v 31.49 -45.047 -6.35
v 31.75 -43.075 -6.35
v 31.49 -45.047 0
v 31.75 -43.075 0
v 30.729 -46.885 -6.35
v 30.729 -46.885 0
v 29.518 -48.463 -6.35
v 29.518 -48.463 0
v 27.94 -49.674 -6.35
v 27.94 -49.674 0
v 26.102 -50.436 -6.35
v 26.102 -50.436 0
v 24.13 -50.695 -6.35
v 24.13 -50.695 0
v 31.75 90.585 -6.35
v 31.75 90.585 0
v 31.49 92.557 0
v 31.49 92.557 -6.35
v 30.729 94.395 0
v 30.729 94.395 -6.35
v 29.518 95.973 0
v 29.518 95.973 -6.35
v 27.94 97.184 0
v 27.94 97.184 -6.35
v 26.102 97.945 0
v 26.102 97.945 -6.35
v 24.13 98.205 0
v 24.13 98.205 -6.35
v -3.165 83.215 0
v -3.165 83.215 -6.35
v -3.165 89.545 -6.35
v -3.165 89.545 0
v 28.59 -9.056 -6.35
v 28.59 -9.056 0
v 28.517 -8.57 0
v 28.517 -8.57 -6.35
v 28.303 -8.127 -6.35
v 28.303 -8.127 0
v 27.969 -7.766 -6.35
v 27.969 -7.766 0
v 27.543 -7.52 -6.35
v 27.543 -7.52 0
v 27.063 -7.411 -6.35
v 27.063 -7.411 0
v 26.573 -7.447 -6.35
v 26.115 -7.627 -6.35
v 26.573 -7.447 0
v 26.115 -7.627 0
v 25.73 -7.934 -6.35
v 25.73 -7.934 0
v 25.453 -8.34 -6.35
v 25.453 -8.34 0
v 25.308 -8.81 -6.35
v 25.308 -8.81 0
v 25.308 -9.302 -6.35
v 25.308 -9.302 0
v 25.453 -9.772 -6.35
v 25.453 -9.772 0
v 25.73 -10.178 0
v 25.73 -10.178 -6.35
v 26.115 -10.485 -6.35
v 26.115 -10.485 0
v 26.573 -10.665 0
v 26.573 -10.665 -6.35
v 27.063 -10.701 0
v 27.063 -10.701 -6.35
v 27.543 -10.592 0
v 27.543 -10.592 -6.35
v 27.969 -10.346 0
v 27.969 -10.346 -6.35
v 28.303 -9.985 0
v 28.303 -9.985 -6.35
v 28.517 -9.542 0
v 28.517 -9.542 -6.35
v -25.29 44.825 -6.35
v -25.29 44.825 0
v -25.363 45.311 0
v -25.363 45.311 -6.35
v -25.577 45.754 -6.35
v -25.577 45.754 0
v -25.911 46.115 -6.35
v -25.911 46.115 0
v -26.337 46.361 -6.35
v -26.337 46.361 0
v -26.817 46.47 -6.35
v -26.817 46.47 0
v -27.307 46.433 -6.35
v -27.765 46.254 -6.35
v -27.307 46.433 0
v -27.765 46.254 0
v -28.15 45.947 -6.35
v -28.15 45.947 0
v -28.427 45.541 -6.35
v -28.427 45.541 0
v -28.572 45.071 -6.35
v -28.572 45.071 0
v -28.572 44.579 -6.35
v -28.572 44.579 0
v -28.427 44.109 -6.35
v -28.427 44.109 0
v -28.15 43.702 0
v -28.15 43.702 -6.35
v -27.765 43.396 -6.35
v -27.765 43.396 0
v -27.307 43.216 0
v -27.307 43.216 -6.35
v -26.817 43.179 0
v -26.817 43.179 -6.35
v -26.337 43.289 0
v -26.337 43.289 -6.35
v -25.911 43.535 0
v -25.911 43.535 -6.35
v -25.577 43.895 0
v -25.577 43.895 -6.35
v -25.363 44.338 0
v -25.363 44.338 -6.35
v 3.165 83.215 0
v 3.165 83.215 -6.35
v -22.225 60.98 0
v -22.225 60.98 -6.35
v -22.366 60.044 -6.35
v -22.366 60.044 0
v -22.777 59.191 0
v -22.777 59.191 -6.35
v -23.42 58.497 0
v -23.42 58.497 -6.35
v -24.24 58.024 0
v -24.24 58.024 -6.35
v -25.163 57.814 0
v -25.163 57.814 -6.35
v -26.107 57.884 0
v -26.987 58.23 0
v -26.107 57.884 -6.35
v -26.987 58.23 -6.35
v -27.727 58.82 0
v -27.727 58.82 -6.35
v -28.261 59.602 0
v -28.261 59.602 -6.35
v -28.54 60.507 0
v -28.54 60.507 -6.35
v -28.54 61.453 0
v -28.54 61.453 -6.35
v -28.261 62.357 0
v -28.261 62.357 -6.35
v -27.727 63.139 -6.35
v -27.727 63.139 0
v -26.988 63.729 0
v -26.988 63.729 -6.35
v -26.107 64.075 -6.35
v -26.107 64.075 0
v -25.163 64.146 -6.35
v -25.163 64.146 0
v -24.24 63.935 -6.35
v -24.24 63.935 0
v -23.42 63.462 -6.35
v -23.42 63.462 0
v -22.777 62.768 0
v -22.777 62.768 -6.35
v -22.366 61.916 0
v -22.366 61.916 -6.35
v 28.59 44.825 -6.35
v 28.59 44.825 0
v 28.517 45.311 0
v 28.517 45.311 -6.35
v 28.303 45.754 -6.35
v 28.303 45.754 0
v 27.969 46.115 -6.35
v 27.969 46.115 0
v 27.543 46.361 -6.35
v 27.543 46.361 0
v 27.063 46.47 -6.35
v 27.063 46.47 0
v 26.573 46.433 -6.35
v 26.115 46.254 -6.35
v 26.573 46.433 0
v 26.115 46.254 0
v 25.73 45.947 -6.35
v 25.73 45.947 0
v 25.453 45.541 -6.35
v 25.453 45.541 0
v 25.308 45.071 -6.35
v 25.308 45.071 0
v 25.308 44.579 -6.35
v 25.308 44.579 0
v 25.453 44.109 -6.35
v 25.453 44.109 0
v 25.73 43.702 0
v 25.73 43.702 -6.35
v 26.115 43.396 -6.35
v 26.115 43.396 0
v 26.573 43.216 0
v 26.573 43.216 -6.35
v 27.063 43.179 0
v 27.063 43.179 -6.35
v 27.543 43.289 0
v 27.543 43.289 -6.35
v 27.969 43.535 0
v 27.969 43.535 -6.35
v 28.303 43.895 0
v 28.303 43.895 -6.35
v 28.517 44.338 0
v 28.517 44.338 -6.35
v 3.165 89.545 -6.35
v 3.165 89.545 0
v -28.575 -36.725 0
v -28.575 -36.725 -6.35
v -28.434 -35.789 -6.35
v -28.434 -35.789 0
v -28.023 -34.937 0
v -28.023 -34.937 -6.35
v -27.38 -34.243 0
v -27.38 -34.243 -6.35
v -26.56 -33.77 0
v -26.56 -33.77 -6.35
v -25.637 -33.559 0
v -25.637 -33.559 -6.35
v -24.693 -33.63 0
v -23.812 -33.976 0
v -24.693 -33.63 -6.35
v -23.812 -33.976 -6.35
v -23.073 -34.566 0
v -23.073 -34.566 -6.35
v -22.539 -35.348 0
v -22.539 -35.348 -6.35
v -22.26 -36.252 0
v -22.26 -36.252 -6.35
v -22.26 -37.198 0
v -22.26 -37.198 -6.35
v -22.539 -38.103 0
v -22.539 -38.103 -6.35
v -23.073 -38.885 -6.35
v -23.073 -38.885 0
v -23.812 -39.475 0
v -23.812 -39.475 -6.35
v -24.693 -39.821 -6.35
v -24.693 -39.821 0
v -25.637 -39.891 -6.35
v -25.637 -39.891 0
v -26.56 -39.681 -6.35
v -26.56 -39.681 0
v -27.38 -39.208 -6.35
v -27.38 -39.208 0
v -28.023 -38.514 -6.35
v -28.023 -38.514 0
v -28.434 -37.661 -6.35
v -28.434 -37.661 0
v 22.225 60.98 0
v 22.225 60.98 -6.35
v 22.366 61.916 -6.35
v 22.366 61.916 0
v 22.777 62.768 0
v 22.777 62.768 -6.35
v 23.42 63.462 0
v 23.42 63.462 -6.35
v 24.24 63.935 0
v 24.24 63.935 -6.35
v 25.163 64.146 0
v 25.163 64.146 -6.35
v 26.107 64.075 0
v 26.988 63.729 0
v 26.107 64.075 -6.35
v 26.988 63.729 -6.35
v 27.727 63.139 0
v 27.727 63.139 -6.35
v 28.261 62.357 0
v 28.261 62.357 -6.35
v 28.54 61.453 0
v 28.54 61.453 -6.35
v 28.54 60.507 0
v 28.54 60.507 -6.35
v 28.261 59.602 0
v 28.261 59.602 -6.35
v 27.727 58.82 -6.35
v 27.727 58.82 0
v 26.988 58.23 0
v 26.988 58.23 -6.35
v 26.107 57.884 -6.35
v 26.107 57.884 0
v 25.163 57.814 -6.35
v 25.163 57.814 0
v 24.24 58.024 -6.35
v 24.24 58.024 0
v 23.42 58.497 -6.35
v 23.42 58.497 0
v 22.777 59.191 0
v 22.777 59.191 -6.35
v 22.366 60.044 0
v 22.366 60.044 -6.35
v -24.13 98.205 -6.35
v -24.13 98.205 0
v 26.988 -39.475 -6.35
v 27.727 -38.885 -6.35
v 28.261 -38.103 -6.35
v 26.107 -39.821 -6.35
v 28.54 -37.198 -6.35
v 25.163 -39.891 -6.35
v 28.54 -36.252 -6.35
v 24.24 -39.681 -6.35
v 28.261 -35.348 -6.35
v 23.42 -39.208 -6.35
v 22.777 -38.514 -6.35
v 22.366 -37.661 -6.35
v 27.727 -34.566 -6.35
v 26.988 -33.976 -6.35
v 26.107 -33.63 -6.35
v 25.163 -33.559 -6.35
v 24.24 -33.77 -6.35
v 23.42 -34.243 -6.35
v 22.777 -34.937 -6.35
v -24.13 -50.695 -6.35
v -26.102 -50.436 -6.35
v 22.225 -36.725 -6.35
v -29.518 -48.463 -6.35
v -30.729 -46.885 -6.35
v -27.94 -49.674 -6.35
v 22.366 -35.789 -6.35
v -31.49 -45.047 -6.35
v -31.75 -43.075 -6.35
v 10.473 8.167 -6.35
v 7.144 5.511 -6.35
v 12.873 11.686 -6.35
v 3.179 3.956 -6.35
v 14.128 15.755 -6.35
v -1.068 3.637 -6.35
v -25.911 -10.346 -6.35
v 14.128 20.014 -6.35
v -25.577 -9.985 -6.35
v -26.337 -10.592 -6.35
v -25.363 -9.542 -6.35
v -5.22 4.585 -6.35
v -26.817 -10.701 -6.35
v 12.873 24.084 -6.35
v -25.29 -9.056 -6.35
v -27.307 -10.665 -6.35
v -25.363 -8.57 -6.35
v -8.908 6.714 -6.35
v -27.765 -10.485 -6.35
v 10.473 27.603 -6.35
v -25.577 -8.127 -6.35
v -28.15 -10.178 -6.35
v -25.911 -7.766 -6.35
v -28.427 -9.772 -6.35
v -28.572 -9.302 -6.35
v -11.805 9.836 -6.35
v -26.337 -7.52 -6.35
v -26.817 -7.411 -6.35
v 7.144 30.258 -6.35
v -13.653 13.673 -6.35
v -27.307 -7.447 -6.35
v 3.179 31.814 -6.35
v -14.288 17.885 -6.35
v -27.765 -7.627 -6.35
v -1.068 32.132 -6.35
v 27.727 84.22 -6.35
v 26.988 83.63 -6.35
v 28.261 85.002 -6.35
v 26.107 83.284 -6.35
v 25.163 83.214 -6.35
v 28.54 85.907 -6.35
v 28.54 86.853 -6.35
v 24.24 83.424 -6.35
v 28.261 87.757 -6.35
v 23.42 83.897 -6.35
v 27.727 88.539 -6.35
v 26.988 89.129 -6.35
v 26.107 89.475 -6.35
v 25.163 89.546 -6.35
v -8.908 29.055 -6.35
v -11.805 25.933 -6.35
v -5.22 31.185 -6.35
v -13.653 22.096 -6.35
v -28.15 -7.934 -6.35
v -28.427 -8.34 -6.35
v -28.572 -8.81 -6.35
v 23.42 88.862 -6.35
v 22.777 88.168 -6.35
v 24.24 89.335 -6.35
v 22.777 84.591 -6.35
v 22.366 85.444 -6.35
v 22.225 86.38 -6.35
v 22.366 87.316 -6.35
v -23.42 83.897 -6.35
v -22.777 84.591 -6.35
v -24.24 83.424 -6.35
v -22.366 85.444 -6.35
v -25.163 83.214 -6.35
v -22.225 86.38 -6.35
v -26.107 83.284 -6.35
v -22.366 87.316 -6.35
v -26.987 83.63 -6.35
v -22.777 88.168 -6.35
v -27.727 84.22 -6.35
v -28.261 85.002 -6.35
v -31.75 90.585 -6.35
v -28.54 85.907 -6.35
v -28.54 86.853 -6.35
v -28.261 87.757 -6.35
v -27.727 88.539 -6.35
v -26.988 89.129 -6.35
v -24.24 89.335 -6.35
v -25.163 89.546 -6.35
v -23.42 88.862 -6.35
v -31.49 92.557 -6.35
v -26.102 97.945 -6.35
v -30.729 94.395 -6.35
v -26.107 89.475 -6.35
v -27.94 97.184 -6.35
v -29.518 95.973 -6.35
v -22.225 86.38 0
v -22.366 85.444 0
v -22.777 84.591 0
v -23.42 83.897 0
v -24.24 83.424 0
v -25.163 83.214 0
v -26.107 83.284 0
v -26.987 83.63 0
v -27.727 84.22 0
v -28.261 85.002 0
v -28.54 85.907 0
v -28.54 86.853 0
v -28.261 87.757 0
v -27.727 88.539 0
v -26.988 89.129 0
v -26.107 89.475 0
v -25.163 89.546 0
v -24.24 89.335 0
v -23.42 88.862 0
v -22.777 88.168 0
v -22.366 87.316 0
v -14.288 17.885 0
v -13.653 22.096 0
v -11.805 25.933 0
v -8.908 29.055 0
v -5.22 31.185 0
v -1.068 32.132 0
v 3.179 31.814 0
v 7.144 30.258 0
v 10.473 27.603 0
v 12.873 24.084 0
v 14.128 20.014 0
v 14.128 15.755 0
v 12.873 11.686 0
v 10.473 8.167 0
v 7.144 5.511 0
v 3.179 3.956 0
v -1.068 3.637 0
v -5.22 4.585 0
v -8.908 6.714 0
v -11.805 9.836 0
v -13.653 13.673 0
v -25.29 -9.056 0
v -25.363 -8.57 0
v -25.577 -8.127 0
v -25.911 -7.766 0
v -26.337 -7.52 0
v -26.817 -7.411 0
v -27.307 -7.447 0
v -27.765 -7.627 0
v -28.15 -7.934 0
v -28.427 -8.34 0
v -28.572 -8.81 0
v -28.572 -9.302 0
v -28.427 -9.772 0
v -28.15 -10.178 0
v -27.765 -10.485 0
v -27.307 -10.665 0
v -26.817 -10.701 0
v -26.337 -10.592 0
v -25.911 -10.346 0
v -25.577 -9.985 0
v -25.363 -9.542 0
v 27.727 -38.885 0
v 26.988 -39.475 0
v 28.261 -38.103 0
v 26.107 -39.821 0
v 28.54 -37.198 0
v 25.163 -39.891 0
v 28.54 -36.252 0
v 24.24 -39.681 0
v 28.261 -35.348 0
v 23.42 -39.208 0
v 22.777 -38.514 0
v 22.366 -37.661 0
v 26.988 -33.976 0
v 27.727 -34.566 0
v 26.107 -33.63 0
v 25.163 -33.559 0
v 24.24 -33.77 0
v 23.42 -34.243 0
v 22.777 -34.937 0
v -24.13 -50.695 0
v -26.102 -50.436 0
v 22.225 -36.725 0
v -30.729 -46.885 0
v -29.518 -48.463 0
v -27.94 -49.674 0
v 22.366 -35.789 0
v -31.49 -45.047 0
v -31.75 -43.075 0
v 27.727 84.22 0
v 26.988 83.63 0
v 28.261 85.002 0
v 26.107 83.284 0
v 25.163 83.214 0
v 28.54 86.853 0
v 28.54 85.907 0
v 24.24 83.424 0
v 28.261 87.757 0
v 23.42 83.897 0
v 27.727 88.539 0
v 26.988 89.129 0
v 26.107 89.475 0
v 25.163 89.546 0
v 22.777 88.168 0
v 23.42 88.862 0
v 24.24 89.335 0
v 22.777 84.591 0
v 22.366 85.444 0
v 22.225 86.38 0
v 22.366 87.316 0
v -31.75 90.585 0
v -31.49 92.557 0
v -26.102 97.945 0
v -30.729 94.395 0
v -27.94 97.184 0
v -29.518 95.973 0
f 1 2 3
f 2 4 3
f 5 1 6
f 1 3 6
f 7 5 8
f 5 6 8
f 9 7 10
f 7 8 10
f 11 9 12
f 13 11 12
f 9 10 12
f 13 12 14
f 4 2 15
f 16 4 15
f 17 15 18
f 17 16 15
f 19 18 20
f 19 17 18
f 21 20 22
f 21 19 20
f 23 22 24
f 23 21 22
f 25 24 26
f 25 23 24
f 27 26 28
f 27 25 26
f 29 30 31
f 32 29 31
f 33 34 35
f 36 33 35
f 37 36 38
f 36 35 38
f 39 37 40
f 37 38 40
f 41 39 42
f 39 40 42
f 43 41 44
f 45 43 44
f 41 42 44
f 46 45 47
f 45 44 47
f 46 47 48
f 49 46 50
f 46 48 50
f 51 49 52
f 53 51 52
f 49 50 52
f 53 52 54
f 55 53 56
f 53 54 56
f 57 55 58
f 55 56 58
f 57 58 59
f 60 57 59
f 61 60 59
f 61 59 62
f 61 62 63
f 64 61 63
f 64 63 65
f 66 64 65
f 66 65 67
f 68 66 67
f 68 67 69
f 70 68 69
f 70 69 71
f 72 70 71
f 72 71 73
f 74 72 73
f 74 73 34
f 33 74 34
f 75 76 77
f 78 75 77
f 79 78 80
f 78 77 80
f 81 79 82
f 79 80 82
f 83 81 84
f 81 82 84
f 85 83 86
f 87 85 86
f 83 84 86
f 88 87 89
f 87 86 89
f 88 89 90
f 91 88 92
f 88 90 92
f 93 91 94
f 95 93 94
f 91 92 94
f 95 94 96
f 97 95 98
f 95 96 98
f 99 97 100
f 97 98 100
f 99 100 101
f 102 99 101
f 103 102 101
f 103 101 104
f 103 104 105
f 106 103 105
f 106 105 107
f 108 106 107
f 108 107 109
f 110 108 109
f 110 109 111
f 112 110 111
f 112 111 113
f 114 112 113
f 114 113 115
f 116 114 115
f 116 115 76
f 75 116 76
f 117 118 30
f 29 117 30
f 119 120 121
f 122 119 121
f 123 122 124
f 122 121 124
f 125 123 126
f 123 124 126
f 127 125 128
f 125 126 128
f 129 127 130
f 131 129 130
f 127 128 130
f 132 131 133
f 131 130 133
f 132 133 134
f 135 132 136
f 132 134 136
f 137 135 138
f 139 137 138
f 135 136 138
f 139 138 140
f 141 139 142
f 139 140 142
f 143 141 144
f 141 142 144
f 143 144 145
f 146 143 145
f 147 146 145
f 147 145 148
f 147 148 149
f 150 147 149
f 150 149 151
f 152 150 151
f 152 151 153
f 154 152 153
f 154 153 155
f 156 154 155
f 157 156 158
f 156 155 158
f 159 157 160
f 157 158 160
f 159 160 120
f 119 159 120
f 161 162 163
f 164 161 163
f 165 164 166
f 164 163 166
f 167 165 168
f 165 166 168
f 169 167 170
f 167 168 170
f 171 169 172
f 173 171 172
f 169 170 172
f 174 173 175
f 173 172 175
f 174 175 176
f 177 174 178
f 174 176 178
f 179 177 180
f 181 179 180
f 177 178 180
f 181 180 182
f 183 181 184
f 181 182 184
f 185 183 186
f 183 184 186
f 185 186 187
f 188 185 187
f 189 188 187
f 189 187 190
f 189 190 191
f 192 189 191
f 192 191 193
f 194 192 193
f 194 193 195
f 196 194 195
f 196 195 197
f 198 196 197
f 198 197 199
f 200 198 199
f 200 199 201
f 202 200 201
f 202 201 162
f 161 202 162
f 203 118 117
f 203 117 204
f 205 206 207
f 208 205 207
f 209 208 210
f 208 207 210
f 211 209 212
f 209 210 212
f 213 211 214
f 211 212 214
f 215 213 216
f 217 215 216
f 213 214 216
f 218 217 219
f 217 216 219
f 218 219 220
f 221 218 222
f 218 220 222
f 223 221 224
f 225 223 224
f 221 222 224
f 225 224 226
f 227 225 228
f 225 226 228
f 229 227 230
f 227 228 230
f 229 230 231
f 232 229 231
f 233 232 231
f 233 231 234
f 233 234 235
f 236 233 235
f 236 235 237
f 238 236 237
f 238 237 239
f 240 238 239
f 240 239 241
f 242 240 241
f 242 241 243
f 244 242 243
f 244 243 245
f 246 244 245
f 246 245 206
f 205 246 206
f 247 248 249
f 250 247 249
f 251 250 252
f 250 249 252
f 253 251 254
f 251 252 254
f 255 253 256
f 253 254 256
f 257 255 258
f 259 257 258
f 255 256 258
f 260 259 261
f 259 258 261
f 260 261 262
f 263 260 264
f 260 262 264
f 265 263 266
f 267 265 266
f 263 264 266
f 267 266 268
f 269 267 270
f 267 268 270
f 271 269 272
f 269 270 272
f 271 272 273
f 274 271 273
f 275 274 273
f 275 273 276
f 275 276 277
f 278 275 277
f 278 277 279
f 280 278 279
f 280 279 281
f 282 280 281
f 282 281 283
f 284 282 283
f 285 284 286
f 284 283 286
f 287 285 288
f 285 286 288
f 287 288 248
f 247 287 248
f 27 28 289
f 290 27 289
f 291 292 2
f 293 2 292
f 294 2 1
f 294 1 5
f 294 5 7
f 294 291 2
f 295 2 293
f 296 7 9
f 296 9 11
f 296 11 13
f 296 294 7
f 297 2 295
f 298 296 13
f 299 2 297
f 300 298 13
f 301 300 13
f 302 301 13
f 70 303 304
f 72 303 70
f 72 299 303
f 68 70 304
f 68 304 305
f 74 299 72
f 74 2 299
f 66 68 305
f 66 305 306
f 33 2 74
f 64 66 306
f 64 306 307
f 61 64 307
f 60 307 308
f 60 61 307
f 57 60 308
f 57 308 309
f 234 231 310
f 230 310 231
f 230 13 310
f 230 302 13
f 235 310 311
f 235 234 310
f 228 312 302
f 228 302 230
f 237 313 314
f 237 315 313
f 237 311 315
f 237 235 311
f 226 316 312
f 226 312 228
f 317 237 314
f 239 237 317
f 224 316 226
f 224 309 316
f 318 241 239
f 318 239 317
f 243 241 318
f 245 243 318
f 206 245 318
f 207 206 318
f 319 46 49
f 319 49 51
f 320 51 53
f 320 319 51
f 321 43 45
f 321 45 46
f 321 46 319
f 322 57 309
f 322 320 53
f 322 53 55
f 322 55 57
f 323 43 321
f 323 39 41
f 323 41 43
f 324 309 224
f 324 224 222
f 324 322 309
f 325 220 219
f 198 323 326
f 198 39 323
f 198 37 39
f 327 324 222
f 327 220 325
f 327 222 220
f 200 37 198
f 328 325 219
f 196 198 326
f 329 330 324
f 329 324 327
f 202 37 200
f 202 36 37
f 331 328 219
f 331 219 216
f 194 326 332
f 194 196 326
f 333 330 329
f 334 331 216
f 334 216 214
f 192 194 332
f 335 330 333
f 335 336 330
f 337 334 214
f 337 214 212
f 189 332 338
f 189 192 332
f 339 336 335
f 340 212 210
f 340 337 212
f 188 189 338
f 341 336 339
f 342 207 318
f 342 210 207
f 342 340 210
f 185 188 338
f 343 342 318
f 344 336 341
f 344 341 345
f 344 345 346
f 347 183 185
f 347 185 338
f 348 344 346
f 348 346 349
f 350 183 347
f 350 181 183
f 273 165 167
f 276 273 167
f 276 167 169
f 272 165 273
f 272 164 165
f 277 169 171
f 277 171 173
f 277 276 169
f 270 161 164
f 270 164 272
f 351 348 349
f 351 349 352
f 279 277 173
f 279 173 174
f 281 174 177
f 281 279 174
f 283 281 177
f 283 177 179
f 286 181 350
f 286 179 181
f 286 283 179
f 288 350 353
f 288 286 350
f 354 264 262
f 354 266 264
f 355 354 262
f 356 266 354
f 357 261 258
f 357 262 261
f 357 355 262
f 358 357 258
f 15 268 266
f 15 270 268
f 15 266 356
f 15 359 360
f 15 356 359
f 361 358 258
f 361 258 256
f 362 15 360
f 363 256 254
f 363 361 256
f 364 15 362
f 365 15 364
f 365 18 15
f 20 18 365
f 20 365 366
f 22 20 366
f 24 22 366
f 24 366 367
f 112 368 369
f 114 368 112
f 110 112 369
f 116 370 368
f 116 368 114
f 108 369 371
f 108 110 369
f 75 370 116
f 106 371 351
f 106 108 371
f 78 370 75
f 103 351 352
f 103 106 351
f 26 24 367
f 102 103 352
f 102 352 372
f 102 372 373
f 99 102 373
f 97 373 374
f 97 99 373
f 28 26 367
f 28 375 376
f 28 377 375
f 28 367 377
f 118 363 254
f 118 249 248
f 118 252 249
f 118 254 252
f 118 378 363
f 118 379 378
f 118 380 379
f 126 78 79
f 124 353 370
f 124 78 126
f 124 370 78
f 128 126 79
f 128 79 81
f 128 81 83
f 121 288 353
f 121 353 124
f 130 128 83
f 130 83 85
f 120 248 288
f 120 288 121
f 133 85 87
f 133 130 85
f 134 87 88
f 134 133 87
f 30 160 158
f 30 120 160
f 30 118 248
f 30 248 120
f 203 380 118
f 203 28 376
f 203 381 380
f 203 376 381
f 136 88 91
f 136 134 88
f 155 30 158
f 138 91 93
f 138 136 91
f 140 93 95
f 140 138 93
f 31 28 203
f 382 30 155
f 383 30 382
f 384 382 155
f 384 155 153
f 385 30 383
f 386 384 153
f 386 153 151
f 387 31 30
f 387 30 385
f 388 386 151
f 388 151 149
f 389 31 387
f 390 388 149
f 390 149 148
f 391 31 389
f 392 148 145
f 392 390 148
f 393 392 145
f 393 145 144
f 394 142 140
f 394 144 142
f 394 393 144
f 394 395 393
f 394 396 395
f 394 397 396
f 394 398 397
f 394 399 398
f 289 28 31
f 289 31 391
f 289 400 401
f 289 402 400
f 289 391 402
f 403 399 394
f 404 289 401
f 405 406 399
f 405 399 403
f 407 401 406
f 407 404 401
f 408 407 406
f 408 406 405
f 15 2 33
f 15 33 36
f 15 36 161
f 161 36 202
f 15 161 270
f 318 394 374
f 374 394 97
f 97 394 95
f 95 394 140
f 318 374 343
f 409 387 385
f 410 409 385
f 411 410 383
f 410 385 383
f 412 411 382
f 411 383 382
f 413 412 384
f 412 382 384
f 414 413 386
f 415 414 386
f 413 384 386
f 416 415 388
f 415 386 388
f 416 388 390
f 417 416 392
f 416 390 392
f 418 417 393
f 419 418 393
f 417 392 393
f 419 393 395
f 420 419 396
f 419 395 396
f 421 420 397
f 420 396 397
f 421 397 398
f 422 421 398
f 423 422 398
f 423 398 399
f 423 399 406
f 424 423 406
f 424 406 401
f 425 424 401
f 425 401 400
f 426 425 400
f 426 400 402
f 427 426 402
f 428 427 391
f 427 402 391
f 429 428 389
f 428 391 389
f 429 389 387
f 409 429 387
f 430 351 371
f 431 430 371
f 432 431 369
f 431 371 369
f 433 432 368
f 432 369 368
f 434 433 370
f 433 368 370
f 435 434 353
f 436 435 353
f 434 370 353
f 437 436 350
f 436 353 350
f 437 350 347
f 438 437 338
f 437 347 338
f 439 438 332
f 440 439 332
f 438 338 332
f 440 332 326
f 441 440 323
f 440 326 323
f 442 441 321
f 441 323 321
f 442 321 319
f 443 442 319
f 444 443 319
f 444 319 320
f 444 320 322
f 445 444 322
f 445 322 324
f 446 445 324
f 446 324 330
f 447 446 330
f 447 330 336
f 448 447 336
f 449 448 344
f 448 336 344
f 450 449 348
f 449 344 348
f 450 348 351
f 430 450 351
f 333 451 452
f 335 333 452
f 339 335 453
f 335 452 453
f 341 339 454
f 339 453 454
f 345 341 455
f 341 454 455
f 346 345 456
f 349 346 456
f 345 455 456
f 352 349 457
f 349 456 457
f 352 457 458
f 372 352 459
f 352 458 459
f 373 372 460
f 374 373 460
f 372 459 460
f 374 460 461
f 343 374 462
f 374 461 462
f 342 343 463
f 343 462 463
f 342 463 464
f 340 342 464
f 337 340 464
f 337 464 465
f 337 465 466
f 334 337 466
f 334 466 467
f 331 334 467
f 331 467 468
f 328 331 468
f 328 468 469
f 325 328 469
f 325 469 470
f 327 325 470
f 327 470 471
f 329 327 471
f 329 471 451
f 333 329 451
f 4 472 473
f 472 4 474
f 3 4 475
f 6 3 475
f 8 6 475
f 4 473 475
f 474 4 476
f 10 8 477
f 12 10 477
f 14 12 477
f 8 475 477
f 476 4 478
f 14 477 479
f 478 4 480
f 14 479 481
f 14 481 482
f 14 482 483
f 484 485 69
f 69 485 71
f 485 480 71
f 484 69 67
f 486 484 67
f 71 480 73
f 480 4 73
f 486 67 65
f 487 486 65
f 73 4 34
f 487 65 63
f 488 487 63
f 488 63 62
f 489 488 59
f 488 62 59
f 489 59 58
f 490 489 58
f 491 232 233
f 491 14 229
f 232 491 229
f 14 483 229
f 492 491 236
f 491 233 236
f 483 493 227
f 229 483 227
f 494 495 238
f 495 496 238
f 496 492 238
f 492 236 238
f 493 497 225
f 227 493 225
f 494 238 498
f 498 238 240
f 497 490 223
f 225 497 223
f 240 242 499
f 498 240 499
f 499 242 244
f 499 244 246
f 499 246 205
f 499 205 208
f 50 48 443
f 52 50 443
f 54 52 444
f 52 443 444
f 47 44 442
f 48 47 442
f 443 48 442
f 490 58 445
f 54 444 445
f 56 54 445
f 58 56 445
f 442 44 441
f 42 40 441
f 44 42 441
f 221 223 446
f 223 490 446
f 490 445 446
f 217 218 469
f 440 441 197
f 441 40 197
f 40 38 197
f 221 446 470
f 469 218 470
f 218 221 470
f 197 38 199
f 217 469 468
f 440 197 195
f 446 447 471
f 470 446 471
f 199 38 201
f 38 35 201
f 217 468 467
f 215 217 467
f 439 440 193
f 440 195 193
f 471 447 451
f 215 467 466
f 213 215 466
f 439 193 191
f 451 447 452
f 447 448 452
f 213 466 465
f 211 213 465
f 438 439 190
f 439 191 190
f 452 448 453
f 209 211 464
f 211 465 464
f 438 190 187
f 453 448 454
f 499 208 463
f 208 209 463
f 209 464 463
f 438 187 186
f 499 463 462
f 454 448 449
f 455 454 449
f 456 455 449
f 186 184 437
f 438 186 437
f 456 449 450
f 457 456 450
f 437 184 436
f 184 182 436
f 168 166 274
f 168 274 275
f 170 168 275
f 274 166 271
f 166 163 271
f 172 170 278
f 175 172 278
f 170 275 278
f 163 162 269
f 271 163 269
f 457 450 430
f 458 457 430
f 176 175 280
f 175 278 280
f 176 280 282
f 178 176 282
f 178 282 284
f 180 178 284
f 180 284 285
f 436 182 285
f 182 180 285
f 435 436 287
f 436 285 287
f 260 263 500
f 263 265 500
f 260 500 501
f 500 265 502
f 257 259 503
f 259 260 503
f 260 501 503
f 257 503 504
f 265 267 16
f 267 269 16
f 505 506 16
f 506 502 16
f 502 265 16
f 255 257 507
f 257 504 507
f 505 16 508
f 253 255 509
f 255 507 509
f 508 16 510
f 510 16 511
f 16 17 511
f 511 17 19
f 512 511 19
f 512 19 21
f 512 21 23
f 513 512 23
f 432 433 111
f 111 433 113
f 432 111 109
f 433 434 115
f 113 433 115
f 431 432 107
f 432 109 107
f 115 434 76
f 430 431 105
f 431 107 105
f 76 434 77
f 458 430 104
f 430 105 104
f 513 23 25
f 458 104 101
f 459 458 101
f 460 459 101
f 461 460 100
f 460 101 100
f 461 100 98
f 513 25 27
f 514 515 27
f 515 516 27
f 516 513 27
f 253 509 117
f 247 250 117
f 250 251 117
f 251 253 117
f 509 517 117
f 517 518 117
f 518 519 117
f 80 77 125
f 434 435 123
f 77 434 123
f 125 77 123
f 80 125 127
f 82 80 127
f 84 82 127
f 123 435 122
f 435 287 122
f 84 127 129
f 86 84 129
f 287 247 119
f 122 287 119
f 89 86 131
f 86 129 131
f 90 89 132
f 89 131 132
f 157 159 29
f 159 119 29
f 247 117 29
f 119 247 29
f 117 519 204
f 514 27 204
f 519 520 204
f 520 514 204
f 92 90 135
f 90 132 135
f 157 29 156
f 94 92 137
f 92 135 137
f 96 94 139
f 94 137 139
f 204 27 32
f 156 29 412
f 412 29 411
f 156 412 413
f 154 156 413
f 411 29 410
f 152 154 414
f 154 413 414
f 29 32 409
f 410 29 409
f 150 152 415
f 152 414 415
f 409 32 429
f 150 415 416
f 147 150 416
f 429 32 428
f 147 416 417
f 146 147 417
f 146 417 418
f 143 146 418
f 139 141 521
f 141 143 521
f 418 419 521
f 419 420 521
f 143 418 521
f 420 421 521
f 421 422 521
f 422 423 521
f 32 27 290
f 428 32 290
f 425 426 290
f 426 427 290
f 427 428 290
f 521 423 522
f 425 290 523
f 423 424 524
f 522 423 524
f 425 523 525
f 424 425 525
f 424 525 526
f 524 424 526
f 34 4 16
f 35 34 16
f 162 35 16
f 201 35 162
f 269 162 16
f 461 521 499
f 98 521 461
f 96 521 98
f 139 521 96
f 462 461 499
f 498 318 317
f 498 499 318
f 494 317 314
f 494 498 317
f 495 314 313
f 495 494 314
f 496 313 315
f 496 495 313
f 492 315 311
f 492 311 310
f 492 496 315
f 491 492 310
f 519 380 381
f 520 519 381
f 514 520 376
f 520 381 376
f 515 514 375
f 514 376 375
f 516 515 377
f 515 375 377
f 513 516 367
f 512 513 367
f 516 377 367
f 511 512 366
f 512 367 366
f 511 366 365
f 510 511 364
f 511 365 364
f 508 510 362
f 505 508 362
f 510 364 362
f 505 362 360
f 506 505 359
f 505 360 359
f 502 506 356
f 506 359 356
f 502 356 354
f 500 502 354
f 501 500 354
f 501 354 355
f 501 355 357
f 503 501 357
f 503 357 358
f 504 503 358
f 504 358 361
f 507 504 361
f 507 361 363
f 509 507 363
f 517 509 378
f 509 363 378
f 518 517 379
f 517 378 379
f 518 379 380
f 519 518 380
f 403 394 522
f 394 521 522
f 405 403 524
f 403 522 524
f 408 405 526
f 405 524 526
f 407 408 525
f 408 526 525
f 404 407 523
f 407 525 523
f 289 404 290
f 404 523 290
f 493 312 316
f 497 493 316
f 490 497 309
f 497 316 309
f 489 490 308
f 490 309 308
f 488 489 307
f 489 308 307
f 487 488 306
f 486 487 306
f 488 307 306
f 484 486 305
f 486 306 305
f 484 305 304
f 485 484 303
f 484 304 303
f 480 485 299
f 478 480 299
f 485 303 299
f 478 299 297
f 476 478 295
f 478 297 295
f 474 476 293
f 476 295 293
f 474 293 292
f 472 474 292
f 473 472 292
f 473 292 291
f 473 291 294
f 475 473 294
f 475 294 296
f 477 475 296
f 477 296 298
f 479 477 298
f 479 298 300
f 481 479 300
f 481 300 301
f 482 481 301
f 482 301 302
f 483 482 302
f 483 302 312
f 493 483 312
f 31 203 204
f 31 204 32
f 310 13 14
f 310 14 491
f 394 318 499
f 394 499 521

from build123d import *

# Parameters (mm, degrees)
BOSS_EXTRUDE1_DEPTH = 6.35
SKETCH2_R           = 1.35
SKETCH2_R_2         = 1.385
CUT_EXTRUDE1_DEPTH  = 38.116505762
SKETCH3_W           = 63.5
SKETCH3_H           = 88.9
SKETCH3_W_2         = 38.321076004
SKETCH3_H_2         = 47.237540142
BOSS_EXTRUDE2_DEPTH = 6.35
SKETCH5_W           = 27.94
SKETCH5_H           = 55.88
CUT_EXTRUDE3_DEPTH  = 61.153053743
SKETCH6_R           = 3.175
CUT_EXTRUDE4_DEPTH  = 61.153053743
SKETCH7_W           = 41.724968974
SKETCH7_H           = 57.858351452
BOSS_EXTRUDE3_DEPTH = 6.35
SKETCH8_R           = 14.2875
CUT_EXTRUDE5_DEPTH  = 6.35
SKETCH10_W          = 63.5
SKETCH10_H          = 60
SKETCH10_R          = 3.175
SKETCH10_W_2        = 6.33
SKETCH10_H_2        = 6.33
BOSS_EXTRUDE4_DEPTH = 6.35
FILLET1_R           = 7.62
SKETCH11_R          = 1.65
CUT_EXTRUDE6_DEPTH  = 104.404858197


with BuildPart() as part:
    # Sketch1 → Boss-Extrude1 (new body)
    with BuildSketch(Plane.XY):
        with BuildLine():
            Line((-19.69889026, 23.2987845), (-14.850045261, 29.75147823))
            ThreePointArc((-14.850045261, 29.75147823), (-14.144755454, 30.339267512), (-13.251155001, 30.55))
            Line((-13.251155001, 30.55), (13.251155001, 30.55))
            ThreePointArc((13.251155001, 30.55), (14.144755454, 30.339267512), (14.850045261, 29.75147823))
            Line((14.850045261, 29.75147823), (19.69889026, 23.2987845))
            ThreePointArc((19.69889026, 23.2987845), (19.997074131, 22.730638521), (20.1, 22.09730627))
            Line((20.1, 22.09730627), (20.1, -22.09730627))
            ThreePointArc((20.1, -22.09730627), (19.997074131, -22.730638521), (19.69889026, -23.2987845))
            Line((19.69889026, -23.2987845), (14.850045261, -29.75147823))
            ThreePointArc((14.850045261, -29.75147823), (14.144755454, -30.339267512), (13.251155001, -30.55))
            Line((13.251155001, -30.55), (-13.251155001, -30.55))
            ThreePointArc((-13.251155001, -30.55), (-14.144755454, -30.339267512), (-14.850045261, -29.75147823))
            Line((-14.850045261, -29.75147823), (-19.69889026, -23.2987845))
            ThreePointArc((-19.69889026, -23.2987845), (-19.997074131, -22.730638521), (-20.1, -22.09730627))
            Line((-20.1, -22.09730627), (-20.1, 22.09730627))
            ThreePointArc((-20.1, 22.09730627), (-19.997074131, 22.730638521), (-19.69889026, 23.2987845))
        make_face()
    extrude(amount=-BOSS_EXTRUDE1_DEPTH)

    # Sketch2 → Cut-Extrude1 (cut, through all)
    with BuildSketch(Plane(origin=(0, 0, -6.35), x_dir=(-1, 0, 0), z_dir=(0, 0, -1))):
        with Locations((17.3, 21.9487845)):
            Circle(SKETCH2_R)
        with Locations((17.3, -0.0512155)):
            Circle(SKETCH2_R)
        with Locations((17.3, -22.0512155)):
            Circle(SKETCH2_R)
        with Locations((11, -27.75)):
            Circle(SKETCH2_R_2)
        with Locations(Location((-11, -27.75, 0), (0, 0, 180))):
            Circle(SKETCH2_R_2)
        with Locations(Location((-17.3, -22.0512155, 0), (0, 0, 180))):
            Circle(SKETCH2_R)
        with Locations(Location((-17.3, -0.0512155, 0), (0, 0, 180))):
            Circle(SKETCH2_R)
        with Locations(Location((-17.3, 21.9487845, 0), (0, 0, 180))):
            Circle(SKETCH2_R)
    extrude(amount=-CUT_EXTRUDE1_DEPTH, mode=Mode.SUBTRACT)

    # Sketch3 → Boss-Extrude2 (add)
    with BuildSketch(Plane(origin=(0, 0, -6.35), x_dir=(-1, 0, 0), z_dir=(0, 0, -1))):
        with Locations((0, -6.2452155)):
            Rectangle(SKETCH3_W, SKETCH3_H)
        Rectangle(SKETCH3_W_2, SKETCH3_H_2, mode=Mode.SUBTRACT)
    extrude(amount=-BOSS_EXTRUDE2_DEPTH)

    # Sketch5 → Cut-Extrude3 (cut, through all)
    with BuildSketch(Plane.XY):
        with Locations((0, 3.0087845)):
            Rectangle(SKETCH5_W, SKETCH5_H)
    extrude(amount=-CUT_EXTRUDE3_DEPTH, mode=Mode.SUBTRACT)

    # Sketch6 → Cut-Extrude4 (cut, through all)
    with BuildSketch(Plane(origin=(0, 0, -6.35), x_dir=(-1, 0, 0), z_dir=(0, 0, -1))):
        with Locations((-25.4, -36.7252155)):
            Circle(SKETCH6_R)
        with Locations((25.4, -36.7252155)):
            Circle(SKETCH6_R)
    extrude(amount=-CUT_EXTRUDE4_DEPTH, mode=Mode.SUBTRACT)

    # Sketch7 → Boss-Extrude3 (add)
    with BuildSketch(Plane(origin=(0, 0, -6.35), x_dir=(-1, 0, 0), z_dir=(0, 0, -1))):
        with Locations((0, 3.16744248)):
            Rectangle(SKETCH7_W, SKETCH7_H)
    extrude(amount=-BOSS_EXTRUDE3_DEPTH)

    # Sketch8 → Cut-Extrude5 (cut)
    with BuildSketch(Plane(origin=(0, 0, -6.35), x_dir=(-1, 0, 0), z_dir=(0, 0, -1))):
        with Locations((0, 17.8847845)):
            Circle(SKETCH8_R)
    extrude(amount=-CUT_EXTRUDE5_DEPTH, mode=Mode.SUBTRACT)

    # Sketch10 → Boss-Extrude4 (add)
    with BuildSketch(Plane(origin=(0, 0, -6.35), x_dir=(-1, 0, 0), z_dir=(0, 0, -1))):
        with Locations((0, 68.2047845)):
            Rectangle(SKETCH10_W, SKETCH10_H)
        with Locations((-25.4, 86.3797845)):
            Circle(SKETCH10_R, mode=Mode.SUBTRACT)
        with Locations((-25.4, 60.9797845)):
            Circle(SKETCH10_R, mode=Mode.SUBTRACT)
        with Locations(Location((25.4, 60.9797845, 0), (0, 0, 180))):
            Circle(SKETCH10_R, mode=Mode.SUBTRACT)
        with Locations(Location((25.4, 86.3797845, 0), (0, 0, 180))):
            Circle(SKETCH10_R, mode=Mode.SUBTRACT)
        with Locations((0, 86.3797845)):
            Rectangle(SKETCH10_W_2, SKETCH10_H_2, mode=Mode.SUBTRACT)
    extrude(amount=-BOSS_EXTRUDE4_DEPTH)

    # Fillet1
    fillet1_edges = [part.edges().sort_by_distance(p)[0] for p in [
        (31.75, 98.2047845, -3.175),
        (-31.75, 98.2047845, -3.175),
        (-31.75, -50.6952155, -3.175),
        (31.75, -50.6952155, -3.175),
    ]]
    fillet(fillet1_edges, radius=FILLET1_R)

    # Sketch11 → Cut-Extrude6 (cut, through all)
    with BuildSketch(Plane.XY):
        with Locations((-26.94, 44.8247845)):
            Circle(SKETCH11_R)
        with Locations((26.94, 44.8247845)):
            Circle(SKETCH11_R)
        with Locations((-26.94, -9.055983818)):
            Circle(SKETCH11_R)
        with Locations((26.94, -9.055983818)):
            Circle(SKETCH11_R)
    extrude(amount=-CUT_EXTRUDE6_DEPTH, mode=Mode.SUBTRACT)


solid = part.part
